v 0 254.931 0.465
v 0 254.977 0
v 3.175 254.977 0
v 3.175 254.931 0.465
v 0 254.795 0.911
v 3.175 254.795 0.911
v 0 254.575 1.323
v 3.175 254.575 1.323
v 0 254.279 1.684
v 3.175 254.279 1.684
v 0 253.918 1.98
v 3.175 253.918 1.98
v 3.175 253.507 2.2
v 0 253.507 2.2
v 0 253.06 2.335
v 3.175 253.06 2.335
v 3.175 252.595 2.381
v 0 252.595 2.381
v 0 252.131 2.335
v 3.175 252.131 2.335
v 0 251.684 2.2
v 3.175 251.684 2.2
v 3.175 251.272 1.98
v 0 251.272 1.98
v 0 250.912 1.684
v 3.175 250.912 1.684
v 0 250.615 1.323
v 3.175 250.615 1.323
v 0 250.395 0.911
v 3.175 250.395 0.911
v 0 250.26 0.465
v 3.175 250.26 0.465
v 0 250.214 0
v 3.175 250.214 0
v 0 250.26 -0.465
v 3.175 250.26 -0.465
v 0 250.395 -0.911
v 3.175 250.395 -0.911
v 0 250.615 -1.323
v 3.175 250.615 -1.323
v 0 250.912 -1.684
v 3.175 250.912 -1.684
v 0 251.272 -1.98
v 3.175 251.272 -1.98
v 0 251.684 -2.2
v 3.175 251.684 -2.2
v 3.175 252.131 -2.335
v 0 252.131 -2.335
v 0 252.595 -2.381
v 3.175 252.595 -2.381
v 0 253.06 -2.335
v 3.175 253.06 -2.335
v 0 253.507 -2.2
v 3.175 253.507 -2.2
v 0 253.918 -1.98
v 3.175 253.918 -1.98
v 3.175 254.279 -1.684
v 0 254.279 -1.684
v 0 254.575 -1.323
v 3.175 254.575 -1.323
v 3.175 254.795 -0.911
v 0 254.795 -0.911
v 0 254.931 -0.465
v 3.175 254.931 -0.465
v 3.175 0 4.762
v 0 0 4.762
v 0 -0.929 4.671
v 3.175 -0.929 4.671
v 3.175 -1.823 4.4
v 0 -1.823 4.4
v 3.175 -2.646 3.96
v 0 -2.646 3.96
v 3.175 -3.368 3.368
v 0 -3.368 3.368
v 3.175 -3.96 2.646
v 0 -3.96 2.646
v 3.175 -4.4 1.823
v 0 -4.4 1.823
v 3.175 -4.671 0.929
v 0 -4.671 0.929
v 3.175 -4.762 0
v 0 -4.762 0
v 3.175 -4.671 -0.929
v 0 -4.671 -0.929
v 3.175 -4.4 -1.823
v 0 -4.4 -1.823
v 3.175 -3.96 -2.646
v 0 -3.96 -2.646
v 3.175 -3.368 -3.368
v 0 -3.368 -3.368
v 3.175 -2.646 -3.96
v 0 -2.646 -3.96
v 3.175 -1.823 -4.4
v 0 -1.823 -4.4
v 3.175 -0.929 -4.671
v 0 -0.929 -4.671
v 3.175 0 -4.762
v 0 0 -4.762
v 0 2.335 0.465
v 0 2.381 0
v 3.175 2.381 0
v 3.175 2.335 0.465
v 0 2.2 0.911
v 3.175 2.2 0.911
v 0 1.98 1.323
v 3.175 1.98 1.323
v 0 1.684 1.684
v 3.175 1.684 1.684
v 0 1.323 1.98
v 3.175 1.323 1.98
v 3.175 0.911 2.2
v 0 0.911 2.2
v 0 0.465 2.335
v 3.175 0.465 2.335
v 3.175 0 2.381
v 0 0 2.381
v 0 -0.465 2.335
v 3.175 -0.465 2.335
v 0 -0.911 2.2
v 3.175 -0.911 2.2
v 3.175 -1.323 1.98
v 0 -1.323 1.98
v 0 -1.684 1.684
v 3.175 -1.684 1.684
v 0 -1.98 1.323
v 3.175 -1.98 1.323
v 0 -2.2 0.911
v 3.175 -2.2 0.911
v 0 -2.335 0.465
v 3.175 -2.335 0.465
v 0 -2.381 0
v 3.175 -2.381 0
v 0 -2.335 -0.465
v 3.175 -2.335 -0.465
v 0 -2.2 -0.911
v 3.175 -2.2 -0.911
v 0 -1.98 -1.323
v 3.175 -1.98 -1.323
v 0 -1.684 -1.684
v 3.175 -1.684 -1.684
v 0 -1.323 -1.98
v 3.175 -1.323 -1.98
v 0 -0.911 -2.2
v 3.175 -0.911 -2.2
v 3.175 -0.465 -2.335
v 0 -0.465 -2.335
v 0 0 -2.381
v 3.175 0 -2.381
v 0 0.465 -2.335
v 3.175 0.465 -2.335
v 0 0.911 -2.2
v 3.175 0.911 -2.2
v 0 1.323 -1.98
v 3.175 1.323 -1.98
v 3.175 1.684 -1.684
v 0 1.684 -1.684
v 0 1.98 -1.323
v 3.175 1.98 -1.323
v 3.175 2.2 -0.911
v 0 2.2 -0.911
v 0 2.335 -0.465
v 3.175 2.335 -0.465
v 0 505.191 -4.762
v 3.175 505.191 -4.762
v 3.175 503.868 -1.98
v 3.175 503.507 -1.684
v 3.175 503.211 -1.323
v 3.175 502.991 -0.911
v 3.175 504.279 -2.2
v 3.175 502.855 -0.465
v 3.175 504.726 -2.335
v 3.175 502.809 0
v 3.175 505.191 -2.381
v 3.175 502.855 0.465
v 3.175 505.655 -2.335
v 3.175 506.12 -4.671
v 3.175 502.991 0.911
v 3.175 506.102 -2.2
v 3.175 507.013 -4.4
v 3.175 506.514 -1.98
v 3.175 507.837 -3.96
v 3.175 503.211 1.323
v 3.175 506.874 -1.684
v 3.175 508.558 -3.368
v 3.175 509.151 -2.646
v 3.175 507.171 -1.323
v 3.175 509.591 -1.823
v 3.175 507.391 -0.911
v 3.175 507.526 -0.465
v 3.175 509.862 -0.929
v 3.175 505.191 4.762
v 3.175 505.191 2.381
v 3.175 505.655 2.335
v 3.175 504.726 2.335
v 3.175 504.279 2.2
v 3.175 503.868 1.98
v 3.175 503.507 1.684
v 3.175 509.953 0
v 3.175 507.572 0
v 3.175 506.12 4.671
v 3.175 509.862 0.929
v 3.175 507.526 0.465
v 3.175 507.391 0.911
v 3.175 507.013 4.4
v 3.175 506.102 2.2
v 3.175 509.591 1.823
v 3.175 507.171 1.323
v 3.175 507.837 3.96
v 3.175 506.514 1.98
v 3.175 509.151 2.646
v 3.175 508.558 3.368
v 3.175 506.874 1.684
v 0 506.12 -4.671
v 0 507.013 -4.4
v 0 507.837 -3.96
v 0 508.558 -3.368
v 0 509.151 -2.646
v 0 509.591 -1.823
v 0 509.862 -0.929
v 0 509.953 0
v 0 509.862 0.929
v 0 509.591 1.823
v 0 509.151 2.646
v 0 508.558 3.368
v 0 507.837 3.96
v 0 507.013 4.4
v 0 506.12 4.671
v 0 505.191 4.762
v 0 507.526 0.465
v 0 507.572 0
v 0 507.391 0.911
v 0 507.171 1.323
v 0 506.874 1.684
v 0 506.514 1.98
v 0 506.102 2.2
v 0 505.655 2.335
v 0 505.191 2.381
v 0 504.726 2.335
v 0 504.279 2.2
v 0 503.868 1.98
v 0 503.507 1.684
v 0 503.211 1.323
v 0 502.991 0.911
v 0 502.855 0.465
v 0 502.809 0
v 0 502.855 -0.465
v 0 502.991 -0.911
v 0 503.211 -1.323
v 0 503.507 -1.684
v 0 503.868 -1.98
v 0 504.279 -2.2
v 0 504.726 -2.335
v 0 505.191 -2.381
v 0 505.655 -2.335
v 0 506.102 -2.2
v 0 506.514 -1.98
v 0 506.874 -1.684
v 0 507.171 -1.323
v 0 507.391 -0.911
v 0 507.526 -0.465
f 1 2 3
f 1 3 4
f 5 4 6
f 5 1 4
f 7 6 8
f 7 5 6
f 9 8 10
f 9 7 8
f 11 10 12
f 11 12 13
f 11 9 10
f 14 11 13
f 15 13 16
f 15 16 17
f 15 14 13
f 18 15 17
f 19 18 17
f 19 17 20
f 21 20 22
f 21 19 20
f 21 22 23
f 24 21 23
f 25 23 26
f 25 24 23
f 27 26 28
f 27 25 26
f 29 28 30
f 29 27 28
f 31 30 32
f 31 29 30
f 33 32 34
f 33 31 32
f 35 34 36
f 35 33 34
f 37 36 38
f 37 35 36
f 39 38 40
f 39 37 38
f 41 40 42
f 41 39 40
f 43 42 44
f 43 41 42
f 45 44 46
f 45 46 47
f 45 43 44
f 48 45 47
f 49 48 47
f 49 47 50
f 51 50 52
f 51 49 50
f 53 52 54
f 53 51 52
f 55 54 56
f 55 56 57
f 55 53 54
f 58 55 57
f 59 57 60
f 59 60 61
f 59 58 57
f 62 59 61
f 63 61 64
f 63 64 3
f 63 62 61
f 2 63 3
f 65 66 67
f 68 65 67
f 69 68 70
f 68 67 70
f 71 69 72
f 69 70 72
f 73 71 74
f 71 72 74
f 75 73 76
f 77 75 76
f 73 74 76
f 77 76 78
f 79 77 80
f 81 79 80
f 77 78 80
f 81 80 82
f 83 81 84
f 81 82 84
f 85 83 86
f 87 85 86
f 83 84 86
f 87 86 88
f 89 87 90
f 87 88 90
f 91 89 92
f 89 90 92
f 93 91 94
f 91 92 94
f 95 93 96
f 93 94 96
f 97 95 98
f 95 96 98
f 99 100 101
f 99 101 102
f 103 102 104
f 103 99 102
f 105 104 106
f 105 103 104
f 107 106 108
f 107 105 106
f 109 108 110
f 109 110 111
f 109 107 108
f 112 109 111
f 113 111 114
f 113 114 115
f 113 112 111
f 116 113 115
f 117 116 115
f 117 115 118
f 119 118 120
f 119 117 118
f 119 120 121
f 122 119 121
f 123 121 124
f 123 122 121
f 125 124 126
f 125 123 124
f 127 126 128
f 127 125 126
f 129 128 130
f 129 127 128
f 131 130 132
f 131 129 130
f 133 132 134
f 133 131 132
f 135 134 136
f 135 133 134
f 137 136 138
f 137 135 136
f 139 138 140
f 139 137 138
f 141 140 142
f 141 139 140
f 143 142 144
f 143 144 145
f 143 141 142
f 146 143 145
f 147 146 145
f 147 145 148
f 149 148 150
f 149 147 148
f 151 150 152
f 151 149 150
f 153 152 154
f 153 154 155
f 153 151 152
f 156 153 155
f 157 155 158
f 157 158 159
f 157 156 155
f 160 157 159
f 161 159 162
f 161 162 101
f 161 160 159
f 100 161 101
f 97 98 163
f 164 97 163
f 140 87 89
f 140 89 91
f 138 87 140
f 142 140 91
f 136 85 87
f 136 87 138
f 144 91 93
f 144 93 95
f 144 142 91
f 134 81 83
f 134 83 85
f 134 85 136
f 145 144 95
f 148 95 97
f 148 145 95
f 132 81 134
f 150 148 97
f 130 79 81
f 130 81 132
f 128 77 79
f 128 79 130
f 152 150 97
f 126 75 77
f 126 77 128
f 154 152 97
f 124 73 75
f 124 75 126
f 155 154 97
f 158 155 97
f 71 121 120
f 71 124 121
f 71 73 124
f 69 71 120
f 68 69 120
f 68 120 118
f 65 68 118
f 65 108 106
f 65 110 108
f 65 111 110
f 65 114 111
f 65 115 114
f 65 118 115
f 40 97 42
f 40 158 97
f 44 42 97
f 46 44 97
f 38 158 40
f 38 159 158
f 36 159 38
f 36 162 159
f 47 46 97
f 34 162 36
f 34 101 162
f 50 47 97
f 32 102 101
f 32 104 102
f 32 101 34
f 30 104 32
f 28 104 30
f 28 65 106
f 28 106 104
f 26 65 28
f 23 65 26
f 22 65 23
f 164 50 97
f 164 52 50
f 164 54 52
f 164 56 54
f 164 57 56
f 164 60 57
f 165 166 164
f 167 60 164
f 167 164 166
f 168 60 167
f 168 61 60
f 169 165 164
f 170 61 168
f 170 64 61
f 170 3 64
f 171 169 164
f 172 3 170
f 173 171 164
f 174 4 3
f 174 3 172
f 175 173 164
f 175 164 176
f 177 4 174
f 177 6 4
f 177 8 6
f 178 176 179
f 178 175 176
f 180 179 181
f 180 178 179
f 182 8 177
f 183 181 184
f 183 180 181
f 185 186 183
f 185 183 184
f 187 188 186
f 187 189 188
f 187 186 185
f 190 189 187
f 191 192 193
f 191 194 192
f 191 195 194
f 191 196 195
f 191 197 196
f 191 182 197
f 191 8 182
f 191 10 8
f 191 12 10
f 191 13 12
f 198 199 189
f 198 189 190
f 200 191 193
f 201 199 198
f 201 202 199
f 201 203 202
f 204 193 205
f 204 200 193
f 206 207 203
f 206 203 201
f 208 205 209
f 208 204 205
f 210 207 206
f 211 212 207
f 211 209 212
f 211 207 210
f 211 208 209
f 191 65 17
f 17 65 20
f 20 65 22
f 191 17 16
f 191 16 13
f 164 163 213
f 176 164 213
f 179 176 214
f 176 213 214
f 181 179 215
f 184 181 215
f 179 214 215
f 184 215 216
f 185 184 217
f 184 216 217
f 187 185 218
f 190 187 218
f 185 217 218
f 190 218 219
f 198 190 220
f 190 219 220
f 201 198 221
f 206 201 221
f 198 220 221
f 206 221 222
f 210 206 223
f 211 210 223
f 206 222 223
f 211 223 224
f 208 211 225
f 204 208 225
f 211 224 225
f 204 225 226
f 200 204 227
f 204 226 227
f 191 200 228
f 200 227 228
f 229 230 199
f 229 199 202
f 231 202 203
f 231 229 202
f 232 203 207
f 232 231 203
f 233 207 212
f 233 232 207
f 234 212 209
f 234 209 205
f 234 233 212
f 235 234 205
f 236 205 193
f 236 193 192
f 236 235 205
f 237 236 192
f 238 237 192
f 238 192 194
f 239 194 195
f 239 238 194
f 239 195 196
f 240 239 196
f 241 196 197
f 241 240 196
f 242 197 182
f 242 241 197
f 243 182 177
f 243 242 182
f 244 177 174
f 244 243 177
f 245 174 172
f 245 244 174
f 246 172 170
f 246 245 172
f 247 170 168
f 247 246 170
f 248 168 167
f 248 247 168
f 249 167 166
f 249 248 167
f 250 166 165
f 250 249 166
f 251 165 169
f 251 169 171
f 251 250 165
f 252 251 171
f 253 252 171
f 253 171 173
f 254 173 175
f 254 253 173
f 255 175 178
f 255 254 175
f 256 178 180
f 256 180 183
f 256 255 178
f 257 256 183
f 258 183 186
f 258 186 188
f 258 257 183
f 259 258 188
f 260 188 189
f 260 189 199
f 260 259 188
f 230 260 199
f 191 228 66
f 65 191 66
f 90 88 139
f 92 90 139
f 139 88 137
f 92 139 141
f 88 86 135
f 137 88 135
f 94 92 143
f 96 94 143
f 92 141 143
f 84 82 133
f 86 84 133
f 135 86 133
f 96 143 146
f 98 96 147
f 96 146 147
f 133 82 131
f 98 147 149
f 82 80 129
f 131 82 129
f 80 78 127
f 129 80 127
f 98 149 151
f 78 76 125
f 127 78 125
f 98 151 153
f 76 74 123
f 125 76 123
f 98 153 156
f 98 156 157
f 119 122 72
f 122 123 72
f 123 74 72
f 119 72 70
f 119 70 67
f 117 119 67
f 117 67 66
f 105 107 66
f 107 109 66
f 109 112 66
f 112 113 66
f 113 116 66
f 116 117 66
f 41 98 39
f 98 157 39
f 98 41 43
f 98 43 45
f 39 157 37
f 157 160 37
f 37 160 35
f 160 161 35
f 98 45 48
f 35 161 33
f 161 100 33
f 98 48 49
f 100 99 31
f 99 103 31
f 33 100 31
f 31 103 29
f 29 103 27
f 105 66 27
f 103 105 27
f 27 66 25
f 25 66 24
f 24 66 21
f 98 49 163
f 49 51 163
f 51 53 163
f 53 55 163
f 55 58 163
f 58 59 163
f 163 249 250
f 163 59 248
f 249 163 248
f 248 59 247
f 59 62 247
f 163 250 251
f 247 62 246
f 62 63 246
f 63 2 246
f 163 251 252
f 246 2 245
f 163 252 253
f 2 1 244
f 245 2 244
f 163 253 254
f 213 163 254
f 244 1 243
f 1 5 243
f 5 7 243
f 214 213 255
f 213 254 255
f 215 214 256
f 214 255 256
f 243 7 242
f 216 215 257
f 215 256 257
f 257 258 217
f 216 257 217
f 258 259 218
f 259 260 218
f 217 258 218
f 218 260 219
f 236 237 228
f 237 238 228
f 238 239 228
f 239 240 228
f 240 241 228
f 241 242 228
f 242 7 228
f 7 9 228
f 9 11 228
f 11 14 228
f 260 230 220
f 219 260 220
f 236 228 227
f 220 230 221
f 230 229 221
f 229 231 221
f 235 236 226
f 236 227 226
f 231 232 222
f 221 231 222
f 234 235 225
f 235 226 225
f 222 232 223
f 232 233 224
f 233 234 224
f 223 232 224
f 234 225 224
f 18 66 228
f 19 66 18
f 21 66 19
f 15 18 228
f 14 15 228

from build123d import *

# Parameters (mm, degrees)
F0_R     = 2.38125
F1_DEPTH = 3.175


with BuildPart() as f1:
    # F0 (on Right) → F1 (new body)
    with BuildSketch(Plane.YZ):
        with BuildLine():
            Line((505.190684, 4.7625), (0, 4.7625))
            ThreePointArc((0, 4.7625), (-4.7625, 0), (0, -4.7625))
            Line((0, -4.7625), (505.190684, -4.7625))
            ThreePointArc((505.190684, -4.7625), (509.953184, 0), (505.190684, 4.7625))
        make_face()
        Circle(F0_R, mode=Mode.SUBTRACT)
        with Locations((252.595342, 0)):
            Circle(F0_R, mode=Mode.SUBTRACT)
        with Locations((505.190684, 0)):
            Circle(F0_R, mode=Mode.SUBTRACT)
    extrude(amount=F1_DEPTH)


solid = f1.part
